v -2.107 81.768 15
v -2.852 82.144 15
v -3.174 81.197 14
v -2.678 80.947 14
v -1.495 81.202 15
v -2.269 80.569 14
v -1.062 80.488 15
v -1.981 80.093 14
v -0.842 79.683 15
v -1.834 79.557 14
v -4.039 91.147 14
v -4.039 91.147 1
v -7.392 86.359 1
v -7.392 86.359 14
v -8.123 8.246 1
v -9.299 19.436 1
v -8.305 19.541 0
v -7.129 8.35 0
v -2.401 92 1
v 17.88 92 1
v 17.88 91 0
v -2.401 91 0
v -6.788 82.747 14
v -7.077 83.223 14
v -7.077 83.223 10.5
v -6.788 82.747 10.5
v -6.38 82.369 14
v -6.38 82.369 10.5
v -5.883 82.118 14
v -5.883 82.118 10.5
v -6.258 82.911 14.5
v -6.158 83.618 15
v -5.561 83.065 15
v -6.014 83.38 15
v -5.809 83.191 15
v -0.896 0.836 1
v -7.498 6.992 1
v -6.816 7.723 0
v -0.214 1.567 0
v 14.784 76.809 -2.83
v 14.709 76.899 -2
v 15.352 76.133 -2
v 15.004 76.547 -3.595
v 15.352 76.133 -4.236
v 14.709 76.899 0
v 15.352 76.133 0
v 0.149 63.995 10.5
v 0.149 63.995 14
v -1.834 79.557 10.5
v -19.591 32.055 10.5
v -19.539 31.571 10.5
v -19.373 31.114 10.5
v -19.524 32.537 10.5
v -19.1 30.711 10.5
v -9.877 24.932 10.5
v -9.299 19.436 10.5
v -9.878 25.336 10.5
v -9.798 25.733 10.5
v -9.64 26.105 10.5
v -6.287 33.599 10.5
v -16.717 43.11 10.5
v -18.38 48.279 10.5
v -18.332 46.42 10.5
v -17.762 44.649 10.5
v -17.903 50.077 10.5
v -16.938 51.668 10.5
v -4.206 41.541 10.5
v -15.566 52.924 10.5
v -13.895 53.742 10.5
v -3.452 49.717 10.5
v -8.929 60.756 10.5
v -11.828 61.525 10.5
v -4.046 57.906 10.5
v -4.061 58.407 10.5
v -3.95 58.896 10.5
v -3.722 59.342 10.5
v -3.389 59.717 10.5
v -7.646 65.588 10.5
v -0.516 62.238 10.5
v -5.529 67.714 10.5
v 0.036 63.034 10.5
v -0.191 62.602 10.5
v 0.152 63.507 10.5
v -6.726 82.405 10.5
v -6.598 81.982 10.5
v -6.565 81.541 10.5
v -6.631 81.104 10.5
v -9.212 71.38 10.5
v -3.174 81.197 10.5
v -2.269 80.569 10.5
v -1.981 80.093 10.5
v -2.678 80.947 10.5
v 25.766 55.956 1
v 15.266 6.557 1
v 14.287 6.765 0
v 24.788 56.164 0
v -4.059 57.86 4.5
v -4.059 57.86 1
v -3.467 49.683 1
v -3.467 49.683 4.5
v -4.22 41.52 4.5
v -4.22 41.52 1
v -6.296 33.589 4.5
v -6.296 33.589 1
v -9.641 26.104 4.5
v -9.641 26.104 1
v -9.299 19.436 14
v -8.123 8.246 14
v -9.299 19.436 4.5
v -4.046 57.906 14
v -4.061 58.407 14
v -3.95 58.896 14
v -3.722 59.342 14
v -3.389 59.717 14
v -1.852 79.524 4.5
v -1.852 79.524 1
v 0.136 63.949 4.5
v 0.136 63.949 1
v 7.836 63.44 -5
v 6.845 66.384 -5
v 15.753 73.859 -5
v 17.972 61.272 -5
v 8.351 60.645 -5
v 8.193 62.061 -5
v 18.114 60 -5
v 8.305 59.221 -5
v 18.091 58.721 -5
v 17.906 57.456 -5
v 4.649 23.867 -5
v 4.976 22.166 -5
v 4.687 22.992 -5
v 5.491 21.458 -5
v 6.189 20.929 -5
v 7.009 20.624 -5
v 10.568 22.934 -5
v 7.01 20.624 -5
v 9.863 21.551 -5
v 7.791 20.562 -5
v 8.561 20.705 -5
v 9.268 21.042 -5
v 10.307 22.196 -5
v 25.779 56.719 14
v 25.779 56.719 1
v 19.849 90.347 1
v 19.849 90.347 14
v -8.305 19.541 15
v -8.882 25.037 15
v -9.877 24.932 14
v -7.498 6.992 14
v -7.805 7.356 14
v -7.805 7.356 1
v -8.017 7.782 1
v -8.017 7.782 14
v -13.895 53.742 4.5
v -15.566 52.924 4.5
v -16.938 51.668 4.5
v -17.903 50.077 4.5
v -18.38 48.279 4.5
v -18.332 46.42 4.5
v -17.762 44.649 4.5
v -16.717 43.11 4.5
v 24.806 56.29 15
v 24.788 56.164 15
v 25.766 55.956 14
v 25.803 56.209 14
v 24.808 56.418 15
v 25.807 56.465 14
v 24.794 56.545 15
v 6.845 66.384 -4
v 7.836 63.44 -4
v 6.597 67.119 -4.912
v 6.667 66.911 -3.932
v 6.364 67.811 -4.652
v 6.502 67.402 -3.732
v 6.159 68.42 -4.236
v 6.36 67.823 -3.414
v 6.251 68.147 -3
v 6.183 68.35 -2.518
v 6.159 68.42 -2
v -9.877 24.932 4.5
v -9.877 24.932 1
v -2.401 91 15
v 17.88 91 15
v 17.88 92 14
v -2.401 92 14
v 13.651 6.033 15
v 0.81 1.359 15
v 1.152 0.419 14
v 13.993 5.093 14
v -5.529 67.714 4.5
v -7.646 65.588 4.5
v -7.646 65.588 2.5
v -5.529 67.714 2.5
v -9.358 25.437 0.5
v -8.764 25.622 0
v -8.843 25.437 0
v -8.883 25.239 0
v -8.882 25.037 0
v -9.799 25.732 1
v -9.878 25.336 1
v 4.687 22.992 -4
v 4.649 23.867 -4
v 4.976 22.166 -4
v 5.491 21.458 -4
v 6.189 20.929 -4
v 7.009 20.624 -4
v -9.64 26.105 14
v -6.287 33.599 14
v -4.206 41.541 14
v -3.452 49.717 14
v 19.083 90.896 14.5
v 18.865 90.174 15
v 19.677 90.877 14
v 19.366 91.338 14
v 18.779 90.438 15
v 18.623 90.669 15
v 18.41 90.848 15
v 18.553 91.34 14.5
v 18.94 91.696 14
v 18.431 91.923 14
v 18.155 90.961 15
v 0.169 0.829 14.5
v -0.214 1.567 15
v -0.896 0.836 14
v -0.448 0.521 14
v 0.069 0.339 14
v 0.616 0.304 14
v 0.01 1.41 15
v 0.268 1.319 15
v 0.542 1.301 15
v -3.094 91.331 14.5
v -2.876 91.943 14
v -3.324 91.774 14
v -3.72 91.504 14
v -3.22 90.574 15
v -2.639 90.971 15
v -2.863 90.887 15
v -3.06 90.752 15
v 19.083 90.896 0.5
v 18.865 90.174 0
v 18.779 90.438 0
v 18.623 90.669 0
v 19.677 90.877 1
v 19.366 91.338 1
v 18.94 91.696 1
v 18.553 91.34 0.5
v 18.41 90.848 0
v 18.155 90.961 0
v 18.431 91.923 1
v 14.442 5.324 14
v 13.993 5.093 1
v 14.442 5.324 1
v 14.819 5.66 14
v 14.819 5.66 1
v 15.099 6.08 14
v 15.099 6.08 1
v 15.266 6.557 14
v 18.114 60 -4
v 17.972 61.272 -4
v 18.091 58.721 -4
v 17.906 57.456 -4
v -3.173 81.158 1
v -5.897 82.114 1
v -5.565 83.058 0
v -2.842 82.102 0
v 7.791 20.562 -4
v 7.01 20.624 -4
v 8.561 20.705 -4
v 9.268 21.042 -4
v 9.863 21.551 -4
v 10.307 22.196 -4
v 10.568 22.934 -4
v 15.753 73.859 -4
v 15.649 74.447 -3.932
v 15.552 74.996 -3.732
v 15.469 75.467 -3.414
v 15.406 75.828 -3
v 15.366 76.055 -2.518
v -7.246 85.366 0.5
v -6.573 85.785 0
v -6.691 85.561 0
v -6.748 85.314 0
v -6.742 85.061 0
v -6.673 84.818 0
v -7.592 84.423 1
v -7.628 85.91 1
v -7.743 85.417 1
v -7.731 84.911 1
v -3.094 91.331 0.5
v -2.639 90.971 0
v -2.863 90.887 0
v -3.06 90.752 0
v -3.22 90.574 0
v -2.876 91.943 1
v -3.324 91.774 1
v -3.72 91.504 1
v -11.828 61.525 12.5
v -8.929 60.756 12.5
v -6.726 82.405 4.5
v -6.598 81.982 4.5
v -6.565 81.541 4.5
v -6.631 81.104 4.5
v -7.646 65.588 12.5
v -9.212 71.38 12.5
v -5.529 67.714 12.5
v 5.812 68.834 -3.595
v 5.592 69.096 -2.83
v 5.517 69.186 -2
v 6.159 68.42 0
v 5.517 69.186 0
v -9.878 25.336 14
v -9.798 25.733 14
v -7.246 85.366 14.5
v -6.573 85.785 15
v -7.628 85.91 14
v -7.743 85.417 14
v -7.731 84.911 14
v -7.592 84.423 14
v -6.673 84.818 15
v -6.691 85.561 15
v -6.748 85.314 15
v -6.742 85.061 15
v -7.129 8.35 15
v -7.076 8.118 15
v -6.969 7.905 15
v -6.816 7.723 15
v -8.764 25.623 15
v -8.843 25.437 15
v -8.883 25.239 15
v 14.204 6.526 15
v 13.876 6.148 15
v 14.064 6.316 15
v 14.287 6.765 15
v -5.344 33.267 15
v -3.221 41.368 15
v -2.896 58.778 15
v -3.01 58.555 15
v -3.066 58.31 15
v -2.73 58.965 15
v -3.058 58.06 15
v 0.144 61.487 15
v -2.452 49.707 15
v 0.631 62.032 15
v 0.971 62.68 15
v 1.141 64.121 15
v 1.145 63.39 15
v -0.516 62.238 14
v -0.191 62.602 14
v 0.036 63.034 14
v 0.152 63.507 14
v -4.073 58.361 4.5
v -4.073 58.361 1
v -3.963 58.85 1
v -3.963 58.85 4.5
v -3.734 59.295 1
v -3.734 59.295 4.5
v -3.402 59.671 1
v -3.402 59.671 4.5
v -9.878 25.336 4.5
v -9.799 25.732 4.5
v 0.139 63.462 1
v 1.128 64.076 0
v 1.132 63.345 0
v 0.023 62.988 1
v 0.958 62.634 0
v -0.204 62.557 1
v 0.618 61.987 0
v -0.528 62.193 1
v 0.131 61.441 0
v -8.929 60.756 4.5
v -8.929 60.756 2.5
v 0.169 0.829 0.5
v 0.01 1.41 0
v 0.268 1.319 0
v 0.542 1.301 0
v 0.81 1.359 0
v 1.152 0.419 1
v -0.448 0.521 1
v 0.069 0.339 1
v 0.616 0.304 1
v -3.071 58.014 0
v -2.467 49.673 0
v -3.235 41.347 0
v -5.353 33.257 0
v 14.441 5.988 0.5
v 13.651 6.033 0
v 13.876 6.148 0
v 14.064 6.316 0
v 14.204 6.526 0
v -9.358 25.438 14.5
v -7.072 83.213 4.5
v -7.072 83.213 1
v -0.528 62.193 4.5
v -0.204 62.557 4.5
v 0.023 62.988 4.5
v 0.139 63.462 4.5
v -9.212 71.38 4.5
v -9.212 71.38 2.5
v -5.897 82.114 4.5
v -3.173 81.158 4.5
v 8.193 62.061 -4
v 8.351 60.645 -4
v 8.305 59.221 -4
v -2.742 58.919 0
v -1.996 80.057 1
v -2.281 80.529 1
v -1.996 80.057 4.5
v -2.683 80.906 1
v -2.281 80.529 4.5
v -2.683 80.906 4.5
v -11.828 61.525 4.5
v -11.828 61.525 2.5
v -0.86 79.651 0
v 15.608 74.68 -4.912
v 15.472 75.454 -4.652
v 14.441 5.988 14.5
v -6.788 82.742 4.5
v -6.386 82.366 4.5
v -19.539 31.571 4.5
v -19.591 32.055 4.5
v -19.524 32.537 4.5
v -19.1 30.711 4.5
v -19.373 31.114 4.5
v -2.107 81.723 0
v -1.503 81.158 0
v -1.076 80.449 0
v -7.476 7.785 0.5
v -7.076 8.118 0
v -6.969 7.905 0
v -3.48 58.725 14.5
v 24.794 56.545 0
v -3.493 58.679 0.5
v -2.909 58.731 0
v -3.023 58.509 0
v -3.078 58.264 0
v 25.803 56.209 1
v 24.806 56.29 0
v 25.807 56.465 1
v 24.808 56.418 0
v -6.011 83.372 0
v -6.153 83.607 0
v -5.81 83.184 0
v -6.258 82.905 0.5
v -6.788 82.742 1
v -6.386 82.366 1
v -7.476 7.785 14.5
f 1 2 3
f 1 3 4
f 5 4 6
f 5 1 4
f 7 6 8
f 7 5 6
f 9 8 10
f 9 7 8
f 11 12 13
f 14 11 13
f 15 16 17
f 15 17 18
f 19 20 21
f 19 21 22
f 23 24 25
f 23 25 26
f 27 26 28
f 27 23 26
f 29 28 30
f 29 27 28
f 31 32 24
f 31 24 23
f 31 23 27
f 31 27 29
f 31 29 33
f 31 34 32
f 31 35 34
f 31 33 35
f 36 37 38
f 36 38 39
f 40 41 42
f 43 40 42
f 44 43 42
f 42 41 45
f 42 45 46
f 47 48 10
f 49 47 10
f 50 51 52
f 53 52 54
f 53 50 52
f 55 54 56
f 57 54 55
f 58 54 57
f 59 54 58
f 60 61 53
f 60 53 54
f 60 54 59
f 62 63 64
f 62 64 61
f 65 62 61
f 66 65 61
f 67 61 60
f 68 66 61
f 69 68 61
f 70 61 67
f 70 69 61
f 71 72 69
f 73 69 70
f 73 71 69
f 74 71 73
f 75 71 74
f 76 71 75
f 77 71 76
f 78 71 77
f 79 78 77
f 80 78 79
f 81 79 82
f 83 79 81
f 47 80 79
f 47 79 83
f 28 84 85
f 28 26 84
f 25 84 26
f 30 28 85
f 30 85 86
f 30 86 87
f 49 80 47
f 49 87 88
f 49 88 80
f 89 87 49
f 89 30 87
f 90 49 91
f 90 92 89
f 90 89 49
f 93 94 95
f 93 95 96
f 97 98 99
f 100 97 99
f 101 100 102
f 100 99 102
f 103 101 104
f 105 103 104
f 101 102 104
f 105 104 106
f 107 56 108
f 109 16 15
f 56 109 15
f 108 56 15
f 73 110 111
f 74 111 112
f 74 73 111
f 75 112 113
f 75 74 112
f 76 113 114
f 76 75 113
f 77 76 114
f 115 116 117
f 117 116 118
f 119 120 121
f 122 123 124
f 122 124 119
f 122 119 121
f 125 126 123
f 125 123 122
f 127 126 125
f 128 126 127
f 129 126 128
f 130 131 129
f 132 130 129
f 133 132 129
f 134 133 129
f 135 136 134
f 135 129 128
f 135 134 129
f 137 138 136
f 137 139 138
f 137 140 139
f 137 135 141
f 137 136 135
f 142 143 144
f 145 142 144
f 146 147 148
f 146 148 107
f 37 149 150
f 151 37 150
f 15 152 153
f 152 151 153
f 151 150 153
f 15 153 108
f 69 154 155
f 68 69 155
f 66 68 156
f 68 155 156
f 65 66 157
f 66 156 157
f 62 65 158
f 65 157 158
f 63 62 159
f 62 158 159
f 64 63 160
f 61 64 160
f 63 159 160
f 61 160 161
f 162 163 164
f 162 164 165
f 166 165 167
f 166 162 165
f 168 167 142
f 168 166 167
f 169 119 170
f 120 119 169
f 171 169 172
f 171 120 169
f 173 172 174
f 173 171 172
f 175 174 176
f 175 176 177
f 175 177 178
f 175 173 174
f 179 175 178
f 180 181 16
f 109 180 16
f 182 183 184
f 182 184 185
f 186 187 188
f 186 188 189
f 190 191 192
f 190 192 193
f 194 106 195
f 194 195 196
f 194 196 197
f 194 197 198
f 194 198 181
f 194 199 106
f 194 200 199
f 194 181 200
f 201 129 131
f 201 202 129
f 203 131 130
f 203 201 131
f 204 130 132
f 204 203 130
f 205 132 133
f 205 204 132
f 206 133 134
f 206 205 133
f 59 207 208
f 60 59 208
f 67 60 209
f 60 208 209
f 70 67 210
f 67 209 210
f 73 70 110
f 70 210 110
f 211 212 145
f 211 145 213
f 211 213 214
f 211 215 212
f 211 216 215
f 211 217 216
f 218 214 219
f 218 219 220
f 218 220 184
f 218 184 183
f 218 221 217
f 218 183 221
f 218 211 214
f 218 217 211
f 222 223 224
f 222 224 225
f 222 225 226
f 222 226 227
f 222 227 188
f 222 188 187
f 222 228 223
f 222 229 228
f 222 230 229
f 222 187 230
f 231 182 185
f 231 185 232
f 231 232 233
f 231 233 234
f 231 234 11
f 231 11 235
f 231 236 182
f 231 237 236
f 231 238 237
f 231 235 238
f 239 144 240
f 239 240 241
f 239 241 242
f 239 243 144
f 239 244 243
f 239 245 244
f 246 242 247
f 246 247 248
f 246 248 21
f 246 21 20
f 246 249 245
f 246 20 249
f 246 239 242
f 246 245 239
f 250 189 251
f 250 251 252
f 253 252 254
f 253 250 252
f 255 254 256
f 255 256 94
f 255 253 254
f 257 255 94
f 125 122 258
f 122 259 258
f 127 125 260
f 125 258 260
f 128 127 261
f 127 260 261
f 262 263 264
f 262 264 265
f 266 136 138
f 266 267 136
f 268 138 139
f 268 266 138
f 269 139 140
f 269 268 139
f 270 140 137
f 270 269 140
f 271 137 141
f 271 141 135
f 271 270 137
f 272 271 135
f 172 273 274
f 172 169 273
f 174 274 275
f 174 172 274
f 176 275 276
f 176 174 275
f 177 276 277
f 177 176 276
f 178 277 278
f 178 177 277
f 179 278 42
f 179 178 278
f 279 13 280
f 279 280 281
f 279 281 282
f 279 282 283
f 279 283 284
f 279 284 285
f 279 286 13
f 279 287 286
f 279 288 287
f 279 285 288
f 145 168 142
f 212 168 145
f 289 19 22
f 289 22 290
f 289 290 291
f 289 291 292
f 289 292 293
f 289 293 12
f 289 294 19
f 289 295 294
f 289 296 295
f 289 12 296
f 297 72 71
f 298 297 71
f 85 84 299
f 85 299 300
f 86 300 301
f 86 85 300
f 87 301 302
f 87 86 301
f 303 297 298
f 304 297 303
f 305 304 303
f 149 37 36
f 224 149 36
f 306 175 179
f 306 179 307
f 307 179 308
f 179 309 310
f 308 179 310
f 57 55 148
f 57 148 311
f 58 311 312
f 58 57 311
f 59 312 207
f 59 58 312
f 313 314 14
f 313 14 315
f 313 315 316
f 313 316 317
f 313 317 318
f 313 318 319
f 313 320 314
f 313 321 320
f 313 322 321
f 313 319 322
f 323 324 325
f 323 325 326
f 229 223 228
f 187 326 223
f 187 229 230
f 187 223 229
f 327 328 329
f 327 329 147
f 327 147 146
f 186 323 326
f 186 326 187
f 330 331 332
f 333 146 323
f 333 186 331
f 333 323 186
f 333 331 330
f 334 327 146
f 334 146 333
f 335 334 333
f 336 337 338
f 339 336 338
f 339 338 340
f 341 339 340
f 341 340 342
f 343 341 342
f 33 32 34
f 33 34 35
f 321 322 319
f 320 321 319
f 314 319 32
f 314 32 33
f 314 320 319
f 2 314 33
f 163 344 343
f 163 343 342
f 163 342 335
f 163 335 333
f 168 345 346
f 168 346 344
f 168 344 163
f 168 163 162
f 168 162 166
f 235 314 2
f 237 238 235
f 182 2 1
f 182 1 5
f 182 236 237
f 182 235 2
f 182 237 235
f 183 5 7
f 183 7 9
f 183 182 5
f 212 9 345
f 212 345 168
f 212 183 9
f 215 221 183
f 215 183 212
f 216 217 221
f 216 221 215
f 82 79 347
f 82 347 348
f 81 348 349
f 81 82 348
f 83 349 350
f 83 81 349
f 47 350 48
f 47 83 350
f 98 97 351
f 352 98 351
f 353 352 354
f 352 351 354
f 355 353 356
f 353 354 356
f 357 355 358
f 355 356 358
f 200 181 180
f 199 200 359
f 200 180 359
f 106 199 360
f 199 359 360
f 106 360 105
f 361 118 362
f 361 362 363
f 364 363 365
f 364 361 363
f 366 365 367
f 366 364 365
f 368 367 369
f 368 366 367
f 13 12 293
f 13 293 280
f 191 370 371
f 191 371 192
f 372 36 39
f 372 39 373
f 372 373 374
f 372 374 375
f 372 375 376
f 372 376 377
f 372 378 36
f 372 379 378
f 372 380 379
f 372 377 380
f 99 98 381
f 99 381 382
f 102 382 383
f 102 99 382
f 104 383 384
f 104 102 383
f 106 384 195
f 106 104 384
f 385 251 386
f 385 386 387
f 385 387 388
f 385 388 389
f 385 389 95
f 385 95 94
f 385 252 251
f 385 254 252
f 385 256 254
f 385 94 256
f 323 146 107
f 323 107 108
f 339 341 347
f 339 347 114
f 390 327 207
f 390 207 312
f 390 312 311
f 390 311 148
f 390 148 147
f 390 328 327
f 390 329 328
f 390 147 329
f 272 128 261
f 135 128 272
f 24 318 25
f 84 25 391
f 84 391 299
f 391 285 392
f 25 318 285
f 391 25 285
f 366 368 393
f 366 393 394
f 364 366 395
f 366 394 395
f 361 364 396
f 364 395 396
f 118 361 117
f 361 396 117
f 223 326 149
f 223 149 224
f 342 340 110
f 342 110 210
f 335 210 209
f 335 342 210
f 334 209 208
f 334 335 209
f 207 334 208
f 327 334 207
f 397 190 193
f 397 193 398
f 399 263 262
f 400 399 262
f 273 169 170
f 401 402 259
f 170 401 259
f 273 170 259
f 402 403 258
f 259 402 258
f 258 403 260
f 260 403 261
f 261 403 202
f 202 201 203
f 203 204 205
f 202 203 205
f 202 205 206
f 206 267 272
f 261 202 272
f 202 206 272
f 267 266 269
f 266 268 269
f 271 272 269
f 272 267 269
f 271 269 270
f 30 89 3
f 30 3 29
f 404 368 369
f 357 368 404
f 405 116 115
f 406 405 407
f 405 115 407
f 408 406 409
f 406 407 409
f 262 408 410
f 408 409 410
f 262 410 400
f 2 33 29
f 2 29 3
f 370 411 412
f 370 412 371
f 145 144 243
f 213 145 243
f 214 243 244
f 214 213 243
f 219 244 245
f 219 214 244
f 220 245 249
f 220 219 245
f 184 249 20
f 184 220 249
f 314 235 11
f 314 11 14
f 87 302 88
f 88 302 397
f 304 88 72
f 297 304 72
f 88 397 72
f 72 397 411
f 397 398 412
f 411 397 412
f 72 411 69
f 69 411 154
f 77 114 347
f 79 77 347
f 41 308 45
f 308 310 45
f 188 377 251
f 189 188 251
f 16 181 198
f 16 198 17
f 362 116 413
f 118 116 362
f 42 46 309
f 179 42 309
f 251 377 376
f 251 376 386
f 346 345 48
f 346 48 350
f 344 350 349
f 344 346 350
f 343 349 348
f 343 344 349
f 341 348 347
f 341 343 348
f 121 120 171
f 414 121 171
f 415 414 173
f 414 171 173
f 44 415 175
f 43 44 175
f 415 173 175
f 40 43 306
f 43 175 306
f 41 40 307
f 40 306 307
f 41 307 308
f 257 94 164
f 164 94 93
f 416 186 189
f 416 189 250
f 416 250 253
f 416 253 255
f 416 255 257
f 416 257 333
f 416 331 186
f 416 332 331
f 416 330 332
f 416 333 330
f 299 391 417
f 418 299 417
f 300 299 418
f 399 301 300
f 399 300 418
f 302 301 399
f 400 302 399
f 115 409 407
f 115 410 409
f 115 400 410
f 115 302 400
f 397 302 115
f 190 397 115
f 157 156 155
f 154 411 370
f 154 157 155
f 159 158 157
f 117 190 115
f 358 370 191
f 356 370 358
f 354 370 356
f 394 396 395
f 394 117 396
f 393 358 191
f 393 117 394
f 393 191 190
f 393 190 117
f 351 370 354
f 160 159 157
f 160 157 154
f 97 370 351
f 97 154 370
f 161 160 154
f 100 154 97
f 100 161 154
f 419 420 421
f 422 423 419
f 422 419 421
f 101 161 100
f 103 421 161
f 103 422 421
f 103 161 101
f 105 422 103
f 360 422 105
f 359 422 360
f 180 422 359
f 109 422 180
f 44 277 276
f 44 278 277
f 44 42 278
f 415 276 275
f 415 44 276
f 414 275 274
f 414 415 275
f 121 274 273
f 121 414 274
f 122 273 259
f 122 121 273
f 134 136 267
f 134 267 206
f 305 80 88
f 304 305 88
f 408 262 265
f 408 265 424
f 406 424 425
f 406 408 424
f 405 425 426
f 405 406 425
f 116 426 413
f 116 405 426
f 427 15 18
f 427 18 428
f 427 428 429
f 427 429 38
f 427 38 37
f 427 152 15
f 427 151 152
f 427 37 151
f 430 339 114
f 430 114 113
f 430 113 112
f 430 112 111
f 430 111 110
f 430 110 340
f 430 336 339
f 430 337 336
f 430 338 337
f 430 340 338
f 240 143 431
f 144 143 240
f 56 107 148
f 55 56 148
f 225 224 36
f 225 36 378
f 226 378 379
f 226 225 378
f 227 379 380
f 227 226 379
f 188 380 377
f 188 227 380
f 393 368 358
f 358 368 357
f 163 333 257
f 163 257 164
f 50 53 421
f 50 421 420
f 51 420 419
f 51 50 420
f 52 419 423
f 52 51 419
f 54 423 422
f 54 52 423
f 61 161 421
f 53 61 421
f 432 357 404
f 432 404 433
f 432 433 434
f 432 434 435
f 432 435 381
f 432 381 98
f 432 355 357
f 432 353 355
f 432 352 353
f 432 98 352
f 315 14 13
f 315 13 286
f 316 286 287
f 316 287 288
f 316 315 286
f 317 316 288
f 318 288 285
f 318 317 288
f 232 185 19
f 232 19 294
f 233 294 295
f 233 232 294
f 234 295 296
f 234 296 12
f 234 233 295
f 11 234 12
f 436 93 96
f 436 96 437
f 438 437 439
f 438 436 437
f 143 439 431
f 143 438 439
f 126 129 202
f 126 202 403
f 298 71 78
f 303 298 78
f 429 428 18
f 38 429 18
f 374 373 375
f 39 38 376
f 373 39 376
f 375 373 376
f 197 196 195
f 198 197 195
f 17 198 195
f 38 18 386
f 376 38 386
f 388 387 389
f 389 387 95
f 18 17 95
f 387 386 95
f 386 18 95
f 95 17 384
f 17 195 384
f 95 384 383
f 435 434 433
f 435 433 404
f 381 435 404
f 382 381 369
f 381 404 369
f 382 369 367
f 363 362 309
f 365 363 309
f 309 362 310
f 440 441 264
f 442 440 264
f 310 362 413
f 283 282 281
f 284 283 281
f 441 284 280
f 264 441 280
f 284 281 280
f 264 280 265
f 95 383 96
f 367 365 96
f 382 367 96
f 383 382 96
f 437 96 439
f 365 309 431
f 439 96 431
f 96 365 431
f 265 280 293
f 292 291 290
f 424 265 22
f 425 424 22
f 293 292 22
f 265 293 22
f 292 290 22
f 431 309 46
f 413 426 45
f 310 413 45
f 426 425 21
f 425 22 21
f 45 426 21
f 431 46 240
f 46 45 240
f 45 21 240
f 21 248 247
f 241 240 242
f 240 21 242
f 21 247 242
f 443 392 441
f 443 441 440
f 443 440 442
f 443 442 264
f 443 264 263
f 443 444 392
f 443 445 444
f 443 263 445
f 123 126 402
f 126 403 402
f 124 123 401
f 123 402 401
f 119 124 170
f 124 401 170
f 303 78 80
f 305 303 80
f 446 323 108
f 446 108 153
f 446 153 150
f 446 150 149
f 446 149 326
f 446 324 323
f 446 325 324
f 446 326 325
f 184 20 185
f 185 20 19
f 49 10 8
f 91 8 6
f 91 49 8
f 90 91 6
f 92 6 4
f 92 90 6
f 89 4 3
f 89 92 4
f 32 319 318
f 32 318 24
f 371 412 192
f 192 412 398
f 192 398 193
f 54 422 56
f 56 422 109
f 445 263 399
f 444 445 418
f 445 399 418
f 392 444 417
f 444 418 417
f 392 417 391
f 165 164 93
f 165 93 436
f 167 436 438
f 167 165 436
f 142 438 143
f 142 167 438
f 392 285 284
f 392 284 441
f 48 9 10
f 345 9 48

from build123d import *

# Parameters (mm, degrees)
F1_DEPTH       = 15
F2_R           = 2
F4_DEPTH       = 4.5
F6_DEPTH       = 4.5
F7_R           = 2
F8_SIZE        = 1
F10_DEPTH      = 2
F10_DEPTH_BACK = 8
F12_DEPTH      = 5
F14_DEPTH      = 1
F15_R          = 10
F16_R          = 3
F17_R          = 2
F18_T1_DEPTH   = 27


# Not quite as in the source:
# - a fillet or chamfer that OpenCascade refuses, or shapes differently, is made with other operations: its cross-section is extruded or revolved along the edge and cut away or added


with BuildPart() as f1:
    # F0 (on Top) → F1 (new body)
    with BuildSketch(Plane.XY):
        Polygon((-8.0448907178, 7.5019819607), (0, 0), (15.0350819326, 5.4723222932), (25.8464898551, 56.3359975314), (19.5579639798, 92), (-3.4420360202, 92), (-8.030647511, 85.4467836457), (-6.4537553867, 81.7707244475), (-13.8947211419, 53.7415962301), (-16.7171564284, 43.1098579407), (-19.7961767409, 31.5115979887), (-9.299232277, 19.4362447051), align=None)
        with BuildLine():
            ThreePointArc((-13.8947211419, 53.7415962301), (-18.2055037731, 49.1954821635), (-16.7171564284, 43.1098579407))
            Line((-16.7171564284, 43.1098579407), (-13.8947211419, 53.7415962301))
        make_face()
    extrude(amount=F1_DEPTH)

    # F2
    f2_edges = [f1.edges().sort_by_distance(p)[0] for p in [
        (-3.442036, 92, 7.5),
        (19.557964, 92, 7.5),
        (-8.030648, 85.446784, 7.5),
        (-6.453755, 81.770724, 7.5),
        (25.84649, 56.335998, 7.5),
        (15.035082, 5.472322, 7.5),
        (-19.796177, 31.511598, 7.5),
        (-8.044891, 7.501982, 7.5),
        (0, 0, 7.5),
    ]]
    fillet(f2_edges, radius=F2_R)

    # F3 (on face) → F4 (cut)
    with BuildSketch(Plane.XY.offset(15)):
        with BuildLine():
            Line((-19.1004557272, 30.7112625143), (-9.299232277, 19.4362447051))
            Line((-9.299232277, 19.4362447051), (-9.9431083431, 25.5623162612))
            ThreePointArc((-9.9431083431, 25.5623162612), (-4.1654007718, 41.7730592838), (-4.2262892289, 58.9825446545))
            Line((-4.2262892289, 58.9825446545), (0.2837840411, 62.9397203012))
            Line((0.2837840411, 62.9397203012), (-1.9921549357, 80.795254507))
            Line((-1.9921549357, 80.795254507), (-6.7258938789, 82.4051351292))
            ThreePointArc((-6.7258938789, 82.4051351292), (-6.5692308005, 81.7622951194), (-6.6308801526, 81.103519015))
            Line((-6.6308801526, 81.103519015), (-13.8947211419, 53.7415962301))
            ThreePointArc((-13.8947211419, 53.7415962301), (-18.2055037731, 49.1954821635), (-16.7171564284, 43.1098579407))
            Line((-16.7171564284, 43.1098579407), (-19.5240798921, 32.5365506243))
            ThreePointArc((-19.5240798921, 32.5365506243), (-19.539255282, 31.5712259114), (-19.1004557272, 30.7112625143))
        make_face()
    extrude(amount=-F4_DEPTH, mode=Mode.SUBTRACT)

    # F5 (on face) → F6 (cut)
    with BuildSketch(Plane(origin=(0, 0, 0), x_dir=(1, 0, 0), z_dir=(0, 0, -1))):
        with BuildLine():
            ThreePointArc((-6.6308801526, -81.103519015), (-6.5692308005, -81.7622951194), (-6.7258938789, -82.4051351292))
            Line((-6.7258938789, -82.4051351292), (-2.0079532375, -80.7495276563))
            Line((-2.0079532375, -80.7495276563), (0.2709017201, -62.8943653752))
            Line((0.2709017201, -62.8943653752), (-4.2385252382, -58.9364532352))
            ThreePointArc((-4.2385252382, -58.9364532352), (-4.1797341848, -41.7514896804), (-9.9430388376, -25.5616549609))
            Line((-9.9430388376, -25.5616549609), (-9.299232277, -19.4362447051))
            Line((-9.299232277, -19.4362447051), (-19.1004557272, -30.7112625143))
            ThreePointArc((-19.1004557272, -30.7112625143), (-19.539255282, -31.5712259114), (-19.5240798921, -32.5365506243))
            Line((-19.5240798921, -32.5365506243), (-16.7171564284, -43.1098579407))
            ThreePointArc((-16.7171564284, -43.1098579407), (-18.2055037731, -49.1954821635), (-13.8947211419, -53.7415962301))
            Line((-13.8947211419, -53.7415962301), (-6.6308801526, -81.103519015))
        make_face()
    extrude(amount=-F6_DEPTH, mode=Mode.SUBTRACT)

    # F7
    f7_edges = [f1.edges().sort_by_distance(p)[0] for p in [
        (-9.943108, 25.562316, 12.75),
        (-9.943039, 25.561655, 2.25),
        (-4.226289, 58.982545, 12.75),
        (0.283784, 62.93972, 12.75),
        (-4.238525, 58.936453, 2.25),
        (0.270902, 62.894365, 2.25),
        (-1.992155, 80.795255, 12.75),
        (-2.007953, 80.749528, 2.25),
        (-6.725894, 82.405135, 7.5),
        (-6.725894, 82.405135, 2.25),
        (-6.725894, 82.405135, 12.75),
    ]]
    fillet(f7_edges, radius=F7_R)

    # F8
    f8_edges = [f1.edges().sort_by_distance(p)[0] for p in [
        (-7.334289, 83.82343, 15),
        (-6.597337, 82.544049, 15),
        (-7.743054, 85.417108, 15),
        (-4.528565, 81.657853, 15),
        (-5.715563, 88.753067, 15),
        (-2.269238, 80.568943, 15),
        (-3.324399, 91.774022, 15),
        (-0.842477, 71.775634, 15),
        (7.739431, 92, 15),
        (0.035819, 63.033597, 15),
        (19.16534, 91.532089, 15),
        (-1.952405, 60.977669, 15),
        (22.814181, 73.533074, 15),
        (-3.950317, 58.895605, 15),
        (25.809062, 56.336651, 15),
        (-4.205609, 41.541288, 15),
        (20.515619, 31.256223, 15),
        (-9.848308, 25.536603, 15),
        (14.818701, 5.66042, 15),
        (-8.999956, 16.588822, 15),
        (7.572505, 2.756166, 15),
        (-7.923879, 7.562316, 15),
        (0.068913, 0.338716, 15),
        (-4.197178, 3.913931, 15),
        (-7.332009, 83.818114, 0),
        (-6.599862, 82.540006, 0),
        (-7.743054, 85.417108, 0),
        (-4.534925, 81.636286, 0),
        (-5.715563, 88.753067, 0),
        (-2.280519, 80.529059, 0),
        (-3.324399, 91.774022, 0),
        (-0.857666, 71.736857, 0),
        (7.739431, 92, 0),
        (0.022922, 62.988201, 0),
        (19.16534, 91.532089, 0),
        (-1.965224, 60.931724, 0),
        (22.814181, 73.533074, 0),
        (-3.962878, 58.849592, 0),
        (25.809062, 56.336651, 0),
        (-4.219912, 41.519712, 0),
        (20.515619, 31.256223, 0),
        (-9.848432, 25.536019, 0),
        (14.818701, 5.66042, 0),
        (-8.999957, 16.588832, 0),
        (7.572505, 2.756166, 0),
        (-7.923879, 7.562316, 0),
        (0.068913, 0.338716, 0),
        (-4.197178, 3.913931, 0),
    ]]
    chamfer(f8_edges, length=F8_SIZE)

    # F9 (on face) → F10 (join, two sides)
    with BuildSketch(Plane.XY.offset(10.5)) as f10_sk:
        Polygon((-9.2121738851, 71.3801288833), (-11.82835392, 61.5253266909), (-8.928788932, 60.7555716127), (-7.6458638018, 65.5881799261), (-5.5294538555, 67.7143993266), align=None)
    extrude(amount=F10_DEPTH)
    extrude(f10_sk.sketch, amount=-F10_DEPTH_BACK)

    # F11 (on face) → F12 (join)
    with BuildSketch(Plane(origin=(0, 0, 0), x_dir=(1, 0, 0), z_dir=(0, 0, -1))):
        Polygon((5.5166269788, -69.1855618273), (14.7091602962, -76.8990131435), (15.3519479059, -76.1329687004), (6.1594145885, -68.4195173842), align=None)
    extrude(amount=F12_DEPTH)

    # F13 (on face) → F14 (join)
    with BuildSketch(Plane(origin=(0, 0, -5), x_dir=(1, 0, 0), z_dir=(0, 0, -1))):
        Polygon((6.1594145885, -68.4195173842), (15.3519479059, -76.1329687004), (18.3099562872, -59.3572695449), (9.9443103961, -20), (4.371628125, -21.1845101828), (8.5288556293, -61.3816455007), align=None)
        Polygon((14.7091602962, -76.8990131435), (15.3519479059, -76.1329687004), (6.1594145885, -68.4195173842), (5.5166269788, -69.1855618273), align=None)
    extrude(amount=-F14_DEPTH)

    # F15
    f15_edges = [f1.edges().sort_by_distance(p)[0] for p in [
        (18.309956, 59.35727, -4.5),
        (8.528856, 61.381646, -4.5),
    ]]
    fillet(f15_edges, radius=F15_R)

    # F16
    f16_edges = [f1.edges().sort_by_distance(p)[0] for p in [
        (4.371628, 21.18451, -4.5),
        (9.94431, 20, -4.5),
    ]]
    fillet(f16_edges, radius=F16_R)

    # F17
    f17_edges = [f1.edges().sort_by_distance(p)[0] for p in [
        (10.755681, 72.276243, -4),
    ]]
    fillet(f17_edges, radius=F17_R)

    # F18: fillet of radius 3 on 1 edges, made by hand

    # F18_s2 → F18_t1 (cut)
    with BuildSketch(Plane(origin=(31.5591951189, 26.4813089845, 0), x_dir=(0, 0, 1), z_dir=(0.7660444431, 0.6427876097, 0))):
        with BuildLine():
            ThreePointArc((-5, -46.4531957126), (-4.1213203436, -48.5745160562), (-2, -49.4531957126))
            Line((-2, -49.4531957126), (-5, -49.4531957126))
            Line((-5, -49.4531957126), (-5, -46.4531957126))
        make_face()
    extrude(amount=F18_T1_DEPTH, mode=Mode.SUBTRACT)


solid = f1.part
